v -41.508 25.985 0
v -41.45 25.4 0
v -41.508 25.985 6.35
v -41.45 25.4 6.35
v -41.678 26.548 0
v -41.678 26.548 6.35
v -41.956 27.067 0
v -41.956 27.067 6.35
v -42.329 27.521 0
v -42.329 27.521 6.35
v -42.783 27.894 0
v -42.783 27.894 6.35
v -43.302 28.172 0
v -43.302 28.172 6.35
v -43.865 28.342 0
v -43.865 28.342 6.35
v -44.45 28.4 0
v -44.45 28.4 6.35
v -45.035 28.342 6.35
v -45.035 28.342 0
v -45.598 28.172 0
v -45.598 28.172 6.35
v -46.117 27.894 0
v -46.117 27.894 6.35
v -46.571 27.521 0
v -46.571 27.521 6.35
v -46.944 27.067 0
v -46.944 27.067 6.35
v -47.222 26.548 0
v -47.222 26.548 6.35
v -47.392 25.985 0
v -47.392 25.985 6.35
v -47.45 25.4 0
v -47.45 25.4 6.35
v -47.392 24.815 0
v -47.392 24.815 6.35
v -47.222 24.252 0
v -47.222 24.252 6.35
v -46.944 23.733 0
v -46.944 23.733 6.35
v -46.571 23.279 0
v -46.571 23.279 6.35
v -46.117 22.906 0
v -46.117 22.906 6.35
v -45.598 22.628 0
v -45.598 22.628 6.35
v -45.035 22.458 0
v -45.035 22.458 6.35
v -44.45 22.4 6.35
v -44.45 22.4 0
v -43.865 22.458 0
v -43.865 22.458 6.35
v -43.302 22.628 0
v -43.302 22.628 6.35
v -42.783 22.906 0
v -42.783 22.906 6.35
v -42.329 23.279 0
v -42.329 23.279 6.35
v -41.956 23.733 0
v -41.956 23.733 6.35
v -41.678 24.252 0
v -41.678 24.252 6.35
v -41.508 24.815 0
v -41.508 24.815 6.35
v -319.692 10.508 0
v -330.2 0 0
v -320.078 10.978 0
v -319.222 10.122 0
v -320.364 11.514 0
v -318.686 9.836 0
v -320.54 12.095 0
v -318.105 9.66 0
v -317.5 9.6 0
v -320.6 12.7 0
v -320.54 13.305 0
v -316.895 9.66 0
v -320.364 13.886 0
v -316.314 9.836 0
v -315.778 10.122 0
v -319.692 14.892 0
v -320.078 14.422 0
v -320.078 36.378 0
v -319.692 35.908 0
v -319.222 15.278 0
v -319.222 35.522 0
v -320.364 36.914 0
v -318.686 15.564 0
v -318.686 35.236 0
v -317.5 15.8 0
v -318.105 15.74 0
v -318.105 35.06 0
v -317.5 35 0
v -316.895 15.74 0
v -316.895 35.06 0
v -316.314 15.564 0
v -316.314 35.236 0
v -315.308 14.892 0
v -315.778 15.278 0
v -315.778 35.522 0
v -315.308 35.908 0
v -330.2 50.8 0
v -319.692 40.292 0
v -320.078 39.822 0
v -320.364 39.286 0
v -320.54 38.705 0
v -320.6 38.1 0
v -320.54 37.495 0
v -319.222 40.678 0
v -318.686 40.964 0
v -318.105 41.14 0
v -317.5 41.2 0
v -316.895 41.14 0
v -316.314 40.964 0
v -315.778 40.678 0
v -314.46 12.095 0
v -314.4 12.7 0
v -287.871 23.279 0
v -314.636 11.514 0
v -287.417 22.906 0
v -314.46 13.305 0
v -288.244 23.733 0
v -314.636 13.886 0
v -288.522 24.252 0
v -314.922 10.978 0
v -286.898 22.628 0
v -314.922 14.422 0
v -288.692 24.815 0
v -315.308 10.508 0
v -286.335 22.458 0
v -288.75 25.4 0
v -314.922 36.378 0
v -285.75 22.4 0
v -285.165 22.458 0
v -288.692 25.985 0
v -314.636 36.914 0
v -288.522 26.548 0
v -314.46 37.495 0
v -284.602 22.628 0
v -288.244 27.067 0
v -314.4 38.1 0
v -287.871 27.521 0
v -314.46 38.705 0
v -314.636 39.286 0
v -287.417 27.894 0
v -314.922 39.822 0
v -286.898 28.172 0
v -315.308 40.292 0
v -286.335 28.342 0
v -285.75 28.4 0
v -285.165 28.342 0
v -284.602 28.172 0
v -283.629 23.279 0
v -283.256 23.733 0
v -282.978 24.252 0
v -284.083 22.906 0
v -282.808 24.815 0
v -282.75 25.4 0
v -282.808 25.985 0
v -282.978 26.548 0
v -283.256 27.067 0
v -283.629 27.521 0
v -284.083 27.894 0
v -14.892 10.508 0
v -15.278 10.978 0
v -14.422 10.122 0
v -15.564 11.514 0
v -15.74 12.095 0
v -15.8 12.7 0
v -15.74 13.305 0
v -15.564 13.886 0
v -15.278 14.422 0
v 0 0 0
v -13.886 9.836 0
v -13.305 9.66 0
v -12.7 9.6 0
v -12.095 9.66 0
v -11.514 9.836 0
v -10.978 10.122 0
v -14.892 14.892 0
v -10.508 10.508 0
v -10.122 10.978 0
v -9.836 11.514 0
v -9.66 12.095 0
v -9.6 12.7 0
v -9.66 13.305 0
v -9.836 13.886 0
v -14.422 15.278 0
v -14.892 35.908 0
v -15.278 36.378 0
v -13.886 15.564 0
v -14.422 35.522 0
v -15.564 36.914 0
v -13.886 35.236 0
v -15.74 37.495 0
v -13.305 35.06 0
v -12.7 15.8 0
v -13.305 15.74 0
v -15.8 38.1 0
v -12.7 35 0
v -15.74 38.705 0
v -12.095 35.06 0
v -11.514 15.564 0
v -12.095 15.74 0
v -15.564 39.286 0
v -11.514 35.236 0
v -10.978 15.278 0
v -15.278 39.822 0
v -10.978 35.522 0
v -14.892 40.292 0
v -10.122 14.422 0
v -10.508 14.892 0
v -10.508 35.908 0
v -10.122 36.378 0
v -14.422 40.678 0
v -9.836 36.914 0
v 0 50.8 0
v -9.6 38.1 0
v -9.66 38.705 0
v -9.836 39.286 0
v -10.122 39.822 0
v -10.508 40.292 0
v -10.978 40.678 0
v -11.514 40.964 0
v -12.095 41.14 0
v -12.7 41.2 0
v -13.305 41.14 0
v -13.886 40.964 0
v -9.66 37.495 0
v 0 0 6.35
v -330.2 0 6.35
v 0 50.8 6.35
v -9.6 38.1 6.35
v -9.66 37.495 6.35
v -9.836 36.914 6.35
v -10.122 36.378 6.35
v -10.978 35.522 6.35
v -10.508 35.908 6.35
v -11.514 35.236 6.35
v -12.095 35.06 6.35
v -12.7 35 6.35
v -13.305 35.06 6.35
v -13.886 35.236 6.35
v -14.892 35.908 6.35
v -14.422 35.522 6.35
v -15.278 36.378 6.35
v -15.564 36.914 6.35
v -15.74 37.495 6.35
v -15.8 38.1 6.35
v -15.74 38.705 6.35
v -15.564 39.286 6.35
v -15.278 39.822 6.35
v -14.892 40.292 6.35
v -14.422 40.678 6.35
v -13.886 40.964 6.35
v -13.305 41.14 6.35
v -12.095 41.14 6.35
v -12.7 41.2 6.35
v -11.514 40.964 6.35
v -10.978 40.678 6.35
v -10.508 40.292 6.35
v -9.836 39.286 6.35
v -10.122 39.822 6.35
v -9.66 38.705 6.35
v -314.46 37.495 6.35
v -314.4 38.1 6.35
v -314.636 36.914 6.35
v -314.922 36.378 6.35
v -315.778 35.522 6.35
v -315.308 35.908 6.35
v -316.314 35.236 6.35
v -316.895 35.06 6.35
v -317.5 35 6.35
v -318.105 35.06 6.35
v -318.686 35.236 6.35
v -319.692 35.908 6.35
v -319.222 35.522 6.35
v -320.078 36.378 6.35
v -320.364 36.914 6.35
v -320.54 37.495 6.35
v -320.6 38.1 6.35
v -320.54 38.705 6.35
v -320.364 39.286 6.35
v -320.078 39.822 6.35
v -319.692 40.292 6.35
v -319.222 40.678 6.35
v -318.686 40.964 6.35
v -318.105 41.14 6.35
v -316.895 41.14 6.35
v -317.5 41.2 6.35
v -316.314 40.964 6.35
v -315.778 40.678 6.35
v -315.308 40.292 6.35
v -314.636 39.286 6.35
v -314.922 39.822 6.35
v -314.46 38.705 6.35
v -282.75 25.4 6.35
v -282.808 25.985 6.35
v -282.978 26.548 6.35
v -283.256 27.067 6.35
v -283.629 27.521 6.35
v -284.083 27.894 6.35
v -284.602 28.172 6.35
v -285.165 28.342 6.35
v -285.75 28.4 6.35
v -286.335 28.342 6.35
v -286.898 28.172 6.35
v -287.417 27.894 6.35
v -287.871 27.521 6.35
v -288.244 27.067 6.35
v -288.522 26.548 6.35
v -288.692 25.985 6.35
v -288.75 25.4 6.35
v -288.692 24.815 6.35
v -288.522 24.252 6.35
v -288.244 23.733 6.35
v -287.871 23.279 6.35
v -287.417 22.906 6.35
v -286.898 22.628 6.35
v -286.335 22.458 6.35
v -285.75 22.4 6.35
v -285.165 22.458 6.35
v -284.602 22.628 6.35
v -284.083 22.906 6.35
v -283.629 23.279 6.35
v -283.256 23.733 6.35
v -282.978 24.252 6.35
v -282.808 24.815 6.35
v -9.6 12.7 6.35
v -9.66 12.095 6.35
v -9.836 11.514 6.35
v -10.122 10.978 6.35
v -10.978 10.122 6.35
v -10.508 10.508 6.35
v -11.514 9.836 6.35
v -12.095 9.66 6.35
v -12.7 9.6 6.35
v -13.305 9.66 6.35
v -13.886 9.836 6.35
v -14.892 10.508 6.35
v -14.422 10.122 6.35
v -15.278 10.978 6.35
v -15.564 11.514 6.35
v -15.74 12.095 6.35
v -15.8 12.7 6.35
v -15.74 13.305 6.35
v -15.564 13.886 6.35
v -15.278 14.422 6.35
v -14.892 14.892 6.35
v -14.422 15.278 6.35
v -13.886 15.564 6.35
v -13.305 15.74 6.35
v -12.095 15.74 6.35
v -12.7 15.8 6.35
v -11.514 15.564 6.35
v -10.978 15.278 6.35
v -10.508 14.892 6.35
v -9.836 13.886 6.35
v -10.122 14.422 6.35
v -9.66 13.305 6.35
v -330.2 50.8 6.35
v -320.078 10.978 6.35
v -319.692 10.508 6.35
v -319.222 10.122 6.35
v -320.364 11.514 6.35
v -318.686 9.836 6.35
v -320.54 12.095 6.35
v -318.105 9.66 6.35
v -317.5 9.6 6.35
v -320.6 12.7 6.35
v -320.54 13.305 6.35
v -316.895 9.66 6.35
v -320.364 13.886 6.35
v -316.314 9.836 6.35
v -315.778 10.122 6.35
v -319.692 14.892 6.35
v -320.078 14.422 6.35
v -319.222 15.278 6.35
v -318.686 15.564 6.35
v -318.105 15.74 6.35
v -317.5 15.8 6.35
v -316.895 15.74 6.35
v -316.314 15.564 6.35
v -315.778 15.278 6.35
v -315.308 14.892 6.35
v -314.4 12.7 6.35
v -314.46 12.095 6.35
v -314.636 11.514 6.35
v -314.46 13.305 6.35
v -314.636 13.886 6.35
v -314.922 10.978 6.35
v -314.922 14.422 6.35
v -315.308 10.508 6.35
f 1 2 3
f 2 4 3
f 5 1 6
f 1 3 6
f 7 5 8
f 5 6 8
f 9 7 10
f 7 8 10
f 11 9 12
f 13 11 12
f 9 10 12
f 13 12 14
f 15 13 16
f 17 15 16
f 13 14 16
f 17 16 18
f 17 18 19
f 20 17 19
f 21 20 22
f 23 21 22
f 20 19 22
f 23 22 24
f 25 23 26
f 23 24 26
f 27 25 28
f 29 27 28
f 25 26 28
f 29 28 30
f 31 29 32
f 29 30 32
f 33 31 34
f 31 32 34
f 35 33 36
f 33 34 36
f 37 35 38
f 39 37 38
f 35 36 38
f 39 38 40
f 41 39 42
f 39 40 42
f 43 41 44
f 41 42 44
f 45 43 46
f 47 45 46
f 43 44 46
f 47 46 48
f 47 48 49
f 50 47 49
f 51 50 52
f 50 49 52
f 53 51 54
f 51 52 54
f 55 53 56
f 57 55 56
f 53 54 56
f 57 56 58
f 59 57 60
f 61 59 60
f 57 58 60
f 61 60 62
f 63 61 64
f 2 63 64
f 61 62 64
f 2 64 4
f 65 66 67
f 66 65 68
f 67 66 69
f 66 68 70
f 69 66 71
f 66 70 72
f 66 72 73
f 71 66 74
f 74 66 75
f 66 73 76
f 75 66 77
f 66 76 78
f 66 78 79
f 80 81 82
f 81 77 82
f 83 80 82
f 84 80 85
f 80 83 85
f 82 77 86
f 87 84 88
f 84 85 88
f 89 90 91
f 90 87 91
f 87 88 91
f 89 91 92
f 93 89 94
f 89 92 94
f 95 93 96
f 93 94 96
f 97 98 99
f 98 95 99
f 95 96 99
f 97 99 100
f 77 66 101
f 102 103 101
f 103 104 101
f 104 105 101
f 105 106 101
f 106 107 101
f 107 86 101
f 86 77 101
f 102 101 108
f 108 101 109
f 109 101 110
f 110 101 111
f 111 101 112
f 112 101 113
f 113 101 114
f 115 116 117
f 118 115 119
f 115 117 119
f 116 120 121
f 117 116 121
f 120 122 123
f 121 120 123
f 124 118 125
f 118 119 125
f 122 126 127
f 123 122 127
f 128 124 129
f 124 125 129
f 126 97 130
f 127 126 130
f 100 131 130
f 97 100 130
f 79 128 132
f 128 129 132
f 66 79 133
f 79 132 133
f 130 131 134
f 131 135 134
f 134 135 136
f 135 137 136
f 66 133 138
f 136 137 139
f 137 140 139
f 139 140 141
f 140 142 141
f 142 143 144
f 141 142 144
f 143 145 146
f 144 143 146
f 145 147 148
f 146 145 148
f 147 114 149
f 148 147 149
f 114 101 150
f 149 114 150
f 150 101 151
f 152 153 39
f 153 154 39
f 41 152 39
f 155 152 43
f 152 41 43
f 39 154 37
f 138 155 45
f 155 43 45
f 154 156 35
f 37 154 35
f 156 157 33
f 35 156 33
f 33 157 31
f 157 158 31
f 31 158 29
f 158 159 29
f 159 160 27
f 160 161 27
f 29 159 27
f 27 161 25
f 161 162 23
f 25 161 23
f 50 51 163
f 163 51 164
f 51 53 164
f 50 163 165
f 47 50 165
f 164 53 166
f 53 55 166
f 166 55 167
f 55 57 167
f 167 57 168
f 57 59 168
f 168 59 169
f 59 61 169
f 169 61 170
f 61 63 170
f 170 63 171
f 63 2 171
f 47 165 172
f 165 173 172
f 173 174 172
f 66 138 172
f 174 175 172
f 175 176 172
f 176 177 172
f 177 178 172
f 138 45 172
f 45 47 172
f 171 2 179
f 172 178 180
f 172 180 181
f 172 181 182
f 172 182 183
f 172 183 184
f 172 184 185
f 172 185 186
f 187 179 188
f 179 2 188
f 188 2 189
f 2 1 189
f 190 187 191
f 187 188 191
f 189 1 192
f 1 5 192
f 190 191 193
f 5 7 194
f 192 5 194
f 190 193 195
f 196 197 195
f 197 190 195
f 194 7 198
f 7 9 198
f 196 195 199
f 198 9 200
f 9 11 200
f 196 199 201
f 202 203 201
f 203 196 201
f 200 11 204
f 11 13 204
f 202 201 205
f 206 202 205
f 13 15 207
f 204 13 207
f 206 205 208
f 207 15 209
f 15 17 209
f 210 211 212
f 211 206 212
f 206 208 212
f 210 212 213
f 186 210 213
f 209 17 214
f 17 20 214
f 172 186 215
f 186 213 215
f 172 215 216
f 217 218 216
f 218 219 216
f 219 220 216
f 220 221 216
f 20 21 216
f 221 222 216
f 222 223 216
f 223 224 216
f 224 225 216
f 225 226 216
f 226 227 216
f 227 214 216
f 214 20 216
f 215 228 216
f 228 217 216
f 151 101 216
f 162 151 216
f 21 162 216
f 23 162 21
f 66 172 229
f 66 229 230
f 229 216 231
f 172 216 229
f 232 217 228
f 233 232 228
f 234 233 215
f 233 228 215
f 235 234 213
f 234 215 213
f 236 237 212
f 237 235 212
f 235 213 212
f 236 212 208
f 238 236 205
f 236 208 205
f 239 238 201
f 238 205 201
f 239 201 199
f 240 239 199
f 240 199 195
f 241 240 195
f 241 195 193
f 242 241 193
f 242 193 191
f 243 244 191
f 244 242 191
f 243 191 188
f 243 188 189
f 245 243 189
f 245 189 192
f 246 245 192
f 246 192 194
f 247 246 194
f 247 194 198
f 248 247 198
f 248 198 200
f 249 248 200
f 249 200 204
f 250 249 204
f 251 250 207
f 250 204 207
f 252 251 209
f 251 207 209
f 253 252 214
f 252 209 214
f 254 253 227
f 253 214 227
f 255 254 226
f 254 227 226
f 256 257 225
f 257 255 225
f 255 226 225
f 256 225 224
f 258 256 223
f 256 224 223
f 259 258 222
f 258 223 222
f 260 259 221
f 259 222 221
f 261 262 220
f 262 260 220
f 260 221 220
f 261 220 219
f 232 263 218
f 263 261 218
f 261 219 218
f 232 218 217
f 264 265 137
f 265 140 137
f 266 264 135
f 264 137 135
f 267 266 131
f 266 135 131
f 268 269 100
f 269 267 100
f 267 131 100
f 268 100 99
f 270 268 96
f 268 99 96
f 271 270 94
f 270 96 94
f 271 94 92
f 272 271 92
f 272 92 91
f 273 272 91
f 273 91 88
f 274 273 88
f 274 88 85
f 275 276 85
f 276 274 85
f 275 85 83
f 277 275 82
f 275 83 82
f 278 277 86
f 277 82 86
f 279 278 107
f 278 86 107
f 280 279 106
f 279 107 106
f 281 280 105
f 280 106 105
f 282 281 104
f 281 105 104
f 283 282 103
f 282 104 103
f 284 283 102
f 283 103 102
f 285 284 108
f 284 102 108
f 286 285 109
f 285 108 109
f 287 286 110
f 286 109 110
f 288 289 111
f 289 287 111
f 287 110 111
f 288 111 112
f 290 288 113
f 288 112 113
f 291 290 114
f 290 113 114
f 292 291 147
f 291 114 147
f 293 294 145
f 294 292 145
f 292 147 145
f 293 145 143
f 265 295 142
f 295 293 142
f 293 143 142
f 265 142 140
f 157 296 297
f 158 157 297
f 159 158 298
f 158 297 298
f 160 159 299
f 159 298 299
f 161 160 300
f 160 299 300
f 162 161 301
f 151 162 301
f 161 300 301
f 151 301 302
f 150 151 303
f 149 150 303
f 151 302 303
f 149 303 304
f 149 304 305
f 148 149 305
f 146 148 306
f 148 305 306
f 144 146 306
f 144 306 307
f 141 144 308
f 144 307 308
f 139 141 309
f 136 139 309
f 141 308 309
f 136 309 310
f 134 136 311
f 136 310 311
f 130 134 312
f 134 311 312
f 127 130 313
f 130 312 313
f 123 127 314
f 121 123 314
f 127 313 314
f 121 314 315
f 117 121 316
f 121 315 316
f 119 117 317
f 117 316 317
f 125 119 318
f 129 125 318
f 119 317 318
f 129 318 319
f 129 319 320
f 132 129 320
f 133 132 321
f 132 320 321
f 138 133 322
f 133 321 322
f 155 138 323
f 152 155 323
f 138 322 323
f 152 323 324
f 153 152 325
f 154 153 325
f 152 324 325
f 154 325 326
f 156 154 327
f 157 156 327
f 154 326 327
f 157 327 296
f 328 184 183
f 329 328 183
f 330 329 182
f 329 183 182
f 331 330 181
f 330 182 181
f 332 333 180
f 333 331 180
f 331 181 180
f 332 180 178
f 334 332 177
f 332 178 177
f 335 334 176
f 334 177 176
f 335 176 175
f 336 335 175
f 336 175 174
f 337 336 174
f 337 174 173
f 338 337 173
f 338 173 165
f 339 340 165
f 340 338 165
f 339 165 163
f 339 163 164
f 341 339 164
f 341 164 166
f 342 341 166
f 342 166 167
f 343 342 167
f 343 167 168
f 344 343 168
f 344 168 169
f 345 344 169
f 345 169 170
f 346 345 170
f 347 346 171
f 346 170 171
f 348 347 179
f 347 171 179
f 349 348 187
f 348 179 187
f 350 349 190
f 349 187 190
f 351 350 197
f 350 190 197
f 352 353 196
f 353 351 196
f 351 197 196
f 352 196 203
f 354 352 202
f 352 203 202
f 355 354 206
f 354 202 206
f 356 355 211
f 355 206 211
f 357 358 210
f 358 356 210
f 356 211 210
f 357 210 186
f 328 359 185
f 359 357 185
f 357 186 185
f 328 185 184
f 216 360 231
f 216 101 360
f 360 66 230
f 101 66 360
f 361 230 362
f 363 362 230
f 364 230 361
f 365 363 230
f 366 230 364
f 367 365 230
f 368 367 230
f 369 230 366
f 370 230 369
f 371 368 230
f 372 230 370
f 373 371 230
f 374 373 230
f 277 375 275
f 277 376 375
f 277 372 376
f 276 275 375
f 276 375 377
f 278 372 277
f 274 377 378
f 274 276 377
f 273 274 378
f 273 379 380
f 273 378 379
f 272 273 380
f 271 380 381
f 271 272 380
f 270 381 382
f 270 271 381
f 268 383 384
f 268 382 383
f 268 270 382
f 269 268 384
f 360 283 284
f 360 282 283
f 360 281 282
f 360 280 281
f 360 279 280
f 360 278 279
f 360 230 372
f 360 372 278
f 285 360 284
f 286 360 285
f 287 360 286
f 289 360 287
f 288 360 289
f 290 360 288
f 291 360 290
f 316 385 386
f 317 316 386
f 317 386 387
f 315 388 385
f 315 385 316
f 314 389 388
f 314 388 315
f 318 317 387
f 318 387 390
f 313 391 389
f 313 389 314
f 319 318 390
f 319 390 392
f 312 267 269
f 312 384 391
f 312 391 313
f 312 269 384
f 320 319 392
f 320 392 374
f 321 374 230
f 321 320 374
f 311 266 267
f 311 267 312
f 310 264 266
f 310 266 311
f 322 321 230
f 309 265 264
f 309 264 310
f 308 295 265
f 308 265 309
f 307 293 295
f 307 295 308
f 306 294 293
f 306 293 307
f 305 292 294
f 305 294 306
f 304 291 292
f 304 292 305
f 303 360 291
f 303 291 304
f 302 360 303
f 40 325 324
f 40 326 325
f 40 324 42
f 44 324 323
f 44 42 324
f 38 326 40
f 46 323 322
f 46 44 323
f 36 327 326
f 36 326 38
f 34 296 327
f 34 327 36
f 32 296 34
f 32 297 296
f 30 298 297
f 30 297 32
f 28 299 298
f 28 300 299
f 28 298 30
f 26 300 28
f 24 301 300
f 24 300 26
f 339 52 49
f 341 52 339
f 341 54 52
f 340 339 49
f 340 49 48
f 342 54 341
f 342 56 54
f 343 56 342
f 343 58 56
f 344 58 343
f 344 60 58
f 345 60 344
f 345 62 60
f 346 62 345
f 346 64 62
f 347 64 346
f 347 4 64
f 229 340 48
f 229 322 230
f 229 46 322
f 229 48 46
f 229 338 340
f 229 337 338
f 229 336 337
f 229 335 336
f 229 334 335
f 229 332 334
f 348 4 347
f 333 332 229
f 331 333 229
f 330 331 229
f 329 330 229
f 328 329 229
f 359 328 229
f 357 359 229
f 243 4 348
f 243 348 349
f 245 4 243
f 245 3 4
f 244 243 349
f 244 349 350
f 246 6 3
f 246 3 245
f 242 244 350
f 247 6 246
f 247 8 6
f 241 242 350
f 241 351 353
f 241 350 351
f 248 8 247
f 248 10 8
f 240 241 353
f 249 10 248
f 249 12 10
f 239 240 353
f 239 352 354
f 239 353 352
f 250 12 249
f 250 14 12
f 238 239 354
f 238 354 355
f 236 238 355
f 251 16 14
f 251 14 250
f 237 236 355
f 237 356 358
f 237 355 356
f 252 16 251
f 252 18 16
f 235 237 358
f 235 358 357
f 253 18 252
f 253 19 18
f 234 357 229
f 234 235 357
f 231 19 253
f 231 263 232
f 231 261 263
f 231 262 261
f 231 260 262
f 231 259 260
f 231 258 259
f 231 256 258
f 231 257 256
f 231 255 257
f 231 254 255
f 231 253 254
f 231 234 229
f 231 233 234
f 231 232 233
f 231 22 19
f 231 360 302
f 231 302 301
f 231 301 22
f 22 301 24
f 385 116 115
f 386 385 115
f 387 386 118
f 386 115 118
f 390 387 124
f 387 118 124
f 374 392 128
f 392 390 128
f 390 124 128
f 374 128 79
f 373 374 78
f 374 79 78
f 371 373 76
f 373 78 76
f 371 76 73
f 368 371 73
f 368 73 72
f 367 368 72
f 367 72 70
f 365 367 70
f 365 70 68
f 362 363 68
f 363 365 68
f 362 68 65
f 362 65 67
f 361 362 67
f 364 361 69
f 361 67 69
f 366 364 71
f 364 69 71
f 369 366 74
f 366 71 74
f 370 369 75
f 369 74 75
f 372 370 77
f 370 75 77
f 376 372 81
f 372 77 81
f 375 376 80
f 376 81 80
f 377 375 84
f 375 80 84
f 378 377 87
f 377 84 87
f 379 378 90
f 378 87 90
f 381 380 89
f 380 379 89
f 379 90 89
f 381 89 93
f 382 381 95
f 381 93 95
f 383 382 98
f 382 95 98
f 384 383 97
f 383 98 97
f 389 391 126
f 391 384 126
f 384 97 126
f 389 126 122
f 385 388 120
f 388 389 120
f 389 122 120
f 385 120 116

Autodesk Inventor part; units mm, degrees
ref_plane "YZ Plane" through (0, 0, 0) normal (1, 0, 0) x (0, 1, 0)
ref_plane "XZ Plane" through (0, 0, 0) normal (0, 1, 0) x (-1, 0, 0)
ref_plane "XY Plane" through (0, 0, 0) normal (0, 0, 1) x (1, 0, 0)
sketch "Sketch1" plane through (0, 0, 0) normal (0, 0, 1) x (1, 0, 0)
  line L0 (0, 0) -> (-330.2, 0)
  line L1 (-330.2, 0) -> (-330.2, 50.8)
  line L2 (-330.2, 50.8) -> (0, 50.8)
  line L3 (0, 50.8) -> (0, 0)
  circle A0 centre (-12.7, 38.1) radius 3.1
  circle A1 centre (-12.7, 12.7) radius 3.1
  circle A2 centre (-317.5, 38.1) radius 3.1
  circle A3 centre (-317.5, 12.7) radius 3.1
  circle A4 centre (-285.75, 25.4) radius 3
  circle A5 centre (-44.45, 25.4) radius 3
  dimension "d0" = 330.2
  dimension "d1" = 50.8
  dimension "d2" = 6.2
  dimension "d3" = 6.2
  dimension "d4" = 6.2
  dimension "d5" = 6.2
  dimension "d6" = 12.7
  dimension "d7" = 12.7
  dimension "d8" = 25.4
  dimension "d9" = 12.7
  dimension "d10" = 12.7
  dimension "d11" = 12.7
  dimension "d12" = 25.4
  dimension "d13" = 12.7
  dimension "d16" = 6
  dimension "d17" = 44.45
  dimension "d18" = 6
  dimension "d19" = 44.45
extrude "Extrusion1" add sketch "Sketch1" along normal blind 6.35 contours L0 L1 L2 L3 | A4 | A5
sketch "Sketch2" plane through (0, 0, 6.35) normal (0, 0, 1) x (1, 0, 0)
  circle A0 centre (-44.45, 25.4) radius 3
  circle A1 centre (-285.75, 25.4) radius 3
  line L0 (0, 0) -> (0, 50.8) projected
  line L1 (-330.2, 50.8) -> (-330.2, 0) projected
  dimension "d20" = 6
  dimension "d21" = 6
  dimension "d22" = 44.45
  dimension "d23" = 44.45
extrude "Extrusion2" cut sketch "Sketch2" against normal blind 6.35
properties part number "outbrace" material "Aluminum 6061"
